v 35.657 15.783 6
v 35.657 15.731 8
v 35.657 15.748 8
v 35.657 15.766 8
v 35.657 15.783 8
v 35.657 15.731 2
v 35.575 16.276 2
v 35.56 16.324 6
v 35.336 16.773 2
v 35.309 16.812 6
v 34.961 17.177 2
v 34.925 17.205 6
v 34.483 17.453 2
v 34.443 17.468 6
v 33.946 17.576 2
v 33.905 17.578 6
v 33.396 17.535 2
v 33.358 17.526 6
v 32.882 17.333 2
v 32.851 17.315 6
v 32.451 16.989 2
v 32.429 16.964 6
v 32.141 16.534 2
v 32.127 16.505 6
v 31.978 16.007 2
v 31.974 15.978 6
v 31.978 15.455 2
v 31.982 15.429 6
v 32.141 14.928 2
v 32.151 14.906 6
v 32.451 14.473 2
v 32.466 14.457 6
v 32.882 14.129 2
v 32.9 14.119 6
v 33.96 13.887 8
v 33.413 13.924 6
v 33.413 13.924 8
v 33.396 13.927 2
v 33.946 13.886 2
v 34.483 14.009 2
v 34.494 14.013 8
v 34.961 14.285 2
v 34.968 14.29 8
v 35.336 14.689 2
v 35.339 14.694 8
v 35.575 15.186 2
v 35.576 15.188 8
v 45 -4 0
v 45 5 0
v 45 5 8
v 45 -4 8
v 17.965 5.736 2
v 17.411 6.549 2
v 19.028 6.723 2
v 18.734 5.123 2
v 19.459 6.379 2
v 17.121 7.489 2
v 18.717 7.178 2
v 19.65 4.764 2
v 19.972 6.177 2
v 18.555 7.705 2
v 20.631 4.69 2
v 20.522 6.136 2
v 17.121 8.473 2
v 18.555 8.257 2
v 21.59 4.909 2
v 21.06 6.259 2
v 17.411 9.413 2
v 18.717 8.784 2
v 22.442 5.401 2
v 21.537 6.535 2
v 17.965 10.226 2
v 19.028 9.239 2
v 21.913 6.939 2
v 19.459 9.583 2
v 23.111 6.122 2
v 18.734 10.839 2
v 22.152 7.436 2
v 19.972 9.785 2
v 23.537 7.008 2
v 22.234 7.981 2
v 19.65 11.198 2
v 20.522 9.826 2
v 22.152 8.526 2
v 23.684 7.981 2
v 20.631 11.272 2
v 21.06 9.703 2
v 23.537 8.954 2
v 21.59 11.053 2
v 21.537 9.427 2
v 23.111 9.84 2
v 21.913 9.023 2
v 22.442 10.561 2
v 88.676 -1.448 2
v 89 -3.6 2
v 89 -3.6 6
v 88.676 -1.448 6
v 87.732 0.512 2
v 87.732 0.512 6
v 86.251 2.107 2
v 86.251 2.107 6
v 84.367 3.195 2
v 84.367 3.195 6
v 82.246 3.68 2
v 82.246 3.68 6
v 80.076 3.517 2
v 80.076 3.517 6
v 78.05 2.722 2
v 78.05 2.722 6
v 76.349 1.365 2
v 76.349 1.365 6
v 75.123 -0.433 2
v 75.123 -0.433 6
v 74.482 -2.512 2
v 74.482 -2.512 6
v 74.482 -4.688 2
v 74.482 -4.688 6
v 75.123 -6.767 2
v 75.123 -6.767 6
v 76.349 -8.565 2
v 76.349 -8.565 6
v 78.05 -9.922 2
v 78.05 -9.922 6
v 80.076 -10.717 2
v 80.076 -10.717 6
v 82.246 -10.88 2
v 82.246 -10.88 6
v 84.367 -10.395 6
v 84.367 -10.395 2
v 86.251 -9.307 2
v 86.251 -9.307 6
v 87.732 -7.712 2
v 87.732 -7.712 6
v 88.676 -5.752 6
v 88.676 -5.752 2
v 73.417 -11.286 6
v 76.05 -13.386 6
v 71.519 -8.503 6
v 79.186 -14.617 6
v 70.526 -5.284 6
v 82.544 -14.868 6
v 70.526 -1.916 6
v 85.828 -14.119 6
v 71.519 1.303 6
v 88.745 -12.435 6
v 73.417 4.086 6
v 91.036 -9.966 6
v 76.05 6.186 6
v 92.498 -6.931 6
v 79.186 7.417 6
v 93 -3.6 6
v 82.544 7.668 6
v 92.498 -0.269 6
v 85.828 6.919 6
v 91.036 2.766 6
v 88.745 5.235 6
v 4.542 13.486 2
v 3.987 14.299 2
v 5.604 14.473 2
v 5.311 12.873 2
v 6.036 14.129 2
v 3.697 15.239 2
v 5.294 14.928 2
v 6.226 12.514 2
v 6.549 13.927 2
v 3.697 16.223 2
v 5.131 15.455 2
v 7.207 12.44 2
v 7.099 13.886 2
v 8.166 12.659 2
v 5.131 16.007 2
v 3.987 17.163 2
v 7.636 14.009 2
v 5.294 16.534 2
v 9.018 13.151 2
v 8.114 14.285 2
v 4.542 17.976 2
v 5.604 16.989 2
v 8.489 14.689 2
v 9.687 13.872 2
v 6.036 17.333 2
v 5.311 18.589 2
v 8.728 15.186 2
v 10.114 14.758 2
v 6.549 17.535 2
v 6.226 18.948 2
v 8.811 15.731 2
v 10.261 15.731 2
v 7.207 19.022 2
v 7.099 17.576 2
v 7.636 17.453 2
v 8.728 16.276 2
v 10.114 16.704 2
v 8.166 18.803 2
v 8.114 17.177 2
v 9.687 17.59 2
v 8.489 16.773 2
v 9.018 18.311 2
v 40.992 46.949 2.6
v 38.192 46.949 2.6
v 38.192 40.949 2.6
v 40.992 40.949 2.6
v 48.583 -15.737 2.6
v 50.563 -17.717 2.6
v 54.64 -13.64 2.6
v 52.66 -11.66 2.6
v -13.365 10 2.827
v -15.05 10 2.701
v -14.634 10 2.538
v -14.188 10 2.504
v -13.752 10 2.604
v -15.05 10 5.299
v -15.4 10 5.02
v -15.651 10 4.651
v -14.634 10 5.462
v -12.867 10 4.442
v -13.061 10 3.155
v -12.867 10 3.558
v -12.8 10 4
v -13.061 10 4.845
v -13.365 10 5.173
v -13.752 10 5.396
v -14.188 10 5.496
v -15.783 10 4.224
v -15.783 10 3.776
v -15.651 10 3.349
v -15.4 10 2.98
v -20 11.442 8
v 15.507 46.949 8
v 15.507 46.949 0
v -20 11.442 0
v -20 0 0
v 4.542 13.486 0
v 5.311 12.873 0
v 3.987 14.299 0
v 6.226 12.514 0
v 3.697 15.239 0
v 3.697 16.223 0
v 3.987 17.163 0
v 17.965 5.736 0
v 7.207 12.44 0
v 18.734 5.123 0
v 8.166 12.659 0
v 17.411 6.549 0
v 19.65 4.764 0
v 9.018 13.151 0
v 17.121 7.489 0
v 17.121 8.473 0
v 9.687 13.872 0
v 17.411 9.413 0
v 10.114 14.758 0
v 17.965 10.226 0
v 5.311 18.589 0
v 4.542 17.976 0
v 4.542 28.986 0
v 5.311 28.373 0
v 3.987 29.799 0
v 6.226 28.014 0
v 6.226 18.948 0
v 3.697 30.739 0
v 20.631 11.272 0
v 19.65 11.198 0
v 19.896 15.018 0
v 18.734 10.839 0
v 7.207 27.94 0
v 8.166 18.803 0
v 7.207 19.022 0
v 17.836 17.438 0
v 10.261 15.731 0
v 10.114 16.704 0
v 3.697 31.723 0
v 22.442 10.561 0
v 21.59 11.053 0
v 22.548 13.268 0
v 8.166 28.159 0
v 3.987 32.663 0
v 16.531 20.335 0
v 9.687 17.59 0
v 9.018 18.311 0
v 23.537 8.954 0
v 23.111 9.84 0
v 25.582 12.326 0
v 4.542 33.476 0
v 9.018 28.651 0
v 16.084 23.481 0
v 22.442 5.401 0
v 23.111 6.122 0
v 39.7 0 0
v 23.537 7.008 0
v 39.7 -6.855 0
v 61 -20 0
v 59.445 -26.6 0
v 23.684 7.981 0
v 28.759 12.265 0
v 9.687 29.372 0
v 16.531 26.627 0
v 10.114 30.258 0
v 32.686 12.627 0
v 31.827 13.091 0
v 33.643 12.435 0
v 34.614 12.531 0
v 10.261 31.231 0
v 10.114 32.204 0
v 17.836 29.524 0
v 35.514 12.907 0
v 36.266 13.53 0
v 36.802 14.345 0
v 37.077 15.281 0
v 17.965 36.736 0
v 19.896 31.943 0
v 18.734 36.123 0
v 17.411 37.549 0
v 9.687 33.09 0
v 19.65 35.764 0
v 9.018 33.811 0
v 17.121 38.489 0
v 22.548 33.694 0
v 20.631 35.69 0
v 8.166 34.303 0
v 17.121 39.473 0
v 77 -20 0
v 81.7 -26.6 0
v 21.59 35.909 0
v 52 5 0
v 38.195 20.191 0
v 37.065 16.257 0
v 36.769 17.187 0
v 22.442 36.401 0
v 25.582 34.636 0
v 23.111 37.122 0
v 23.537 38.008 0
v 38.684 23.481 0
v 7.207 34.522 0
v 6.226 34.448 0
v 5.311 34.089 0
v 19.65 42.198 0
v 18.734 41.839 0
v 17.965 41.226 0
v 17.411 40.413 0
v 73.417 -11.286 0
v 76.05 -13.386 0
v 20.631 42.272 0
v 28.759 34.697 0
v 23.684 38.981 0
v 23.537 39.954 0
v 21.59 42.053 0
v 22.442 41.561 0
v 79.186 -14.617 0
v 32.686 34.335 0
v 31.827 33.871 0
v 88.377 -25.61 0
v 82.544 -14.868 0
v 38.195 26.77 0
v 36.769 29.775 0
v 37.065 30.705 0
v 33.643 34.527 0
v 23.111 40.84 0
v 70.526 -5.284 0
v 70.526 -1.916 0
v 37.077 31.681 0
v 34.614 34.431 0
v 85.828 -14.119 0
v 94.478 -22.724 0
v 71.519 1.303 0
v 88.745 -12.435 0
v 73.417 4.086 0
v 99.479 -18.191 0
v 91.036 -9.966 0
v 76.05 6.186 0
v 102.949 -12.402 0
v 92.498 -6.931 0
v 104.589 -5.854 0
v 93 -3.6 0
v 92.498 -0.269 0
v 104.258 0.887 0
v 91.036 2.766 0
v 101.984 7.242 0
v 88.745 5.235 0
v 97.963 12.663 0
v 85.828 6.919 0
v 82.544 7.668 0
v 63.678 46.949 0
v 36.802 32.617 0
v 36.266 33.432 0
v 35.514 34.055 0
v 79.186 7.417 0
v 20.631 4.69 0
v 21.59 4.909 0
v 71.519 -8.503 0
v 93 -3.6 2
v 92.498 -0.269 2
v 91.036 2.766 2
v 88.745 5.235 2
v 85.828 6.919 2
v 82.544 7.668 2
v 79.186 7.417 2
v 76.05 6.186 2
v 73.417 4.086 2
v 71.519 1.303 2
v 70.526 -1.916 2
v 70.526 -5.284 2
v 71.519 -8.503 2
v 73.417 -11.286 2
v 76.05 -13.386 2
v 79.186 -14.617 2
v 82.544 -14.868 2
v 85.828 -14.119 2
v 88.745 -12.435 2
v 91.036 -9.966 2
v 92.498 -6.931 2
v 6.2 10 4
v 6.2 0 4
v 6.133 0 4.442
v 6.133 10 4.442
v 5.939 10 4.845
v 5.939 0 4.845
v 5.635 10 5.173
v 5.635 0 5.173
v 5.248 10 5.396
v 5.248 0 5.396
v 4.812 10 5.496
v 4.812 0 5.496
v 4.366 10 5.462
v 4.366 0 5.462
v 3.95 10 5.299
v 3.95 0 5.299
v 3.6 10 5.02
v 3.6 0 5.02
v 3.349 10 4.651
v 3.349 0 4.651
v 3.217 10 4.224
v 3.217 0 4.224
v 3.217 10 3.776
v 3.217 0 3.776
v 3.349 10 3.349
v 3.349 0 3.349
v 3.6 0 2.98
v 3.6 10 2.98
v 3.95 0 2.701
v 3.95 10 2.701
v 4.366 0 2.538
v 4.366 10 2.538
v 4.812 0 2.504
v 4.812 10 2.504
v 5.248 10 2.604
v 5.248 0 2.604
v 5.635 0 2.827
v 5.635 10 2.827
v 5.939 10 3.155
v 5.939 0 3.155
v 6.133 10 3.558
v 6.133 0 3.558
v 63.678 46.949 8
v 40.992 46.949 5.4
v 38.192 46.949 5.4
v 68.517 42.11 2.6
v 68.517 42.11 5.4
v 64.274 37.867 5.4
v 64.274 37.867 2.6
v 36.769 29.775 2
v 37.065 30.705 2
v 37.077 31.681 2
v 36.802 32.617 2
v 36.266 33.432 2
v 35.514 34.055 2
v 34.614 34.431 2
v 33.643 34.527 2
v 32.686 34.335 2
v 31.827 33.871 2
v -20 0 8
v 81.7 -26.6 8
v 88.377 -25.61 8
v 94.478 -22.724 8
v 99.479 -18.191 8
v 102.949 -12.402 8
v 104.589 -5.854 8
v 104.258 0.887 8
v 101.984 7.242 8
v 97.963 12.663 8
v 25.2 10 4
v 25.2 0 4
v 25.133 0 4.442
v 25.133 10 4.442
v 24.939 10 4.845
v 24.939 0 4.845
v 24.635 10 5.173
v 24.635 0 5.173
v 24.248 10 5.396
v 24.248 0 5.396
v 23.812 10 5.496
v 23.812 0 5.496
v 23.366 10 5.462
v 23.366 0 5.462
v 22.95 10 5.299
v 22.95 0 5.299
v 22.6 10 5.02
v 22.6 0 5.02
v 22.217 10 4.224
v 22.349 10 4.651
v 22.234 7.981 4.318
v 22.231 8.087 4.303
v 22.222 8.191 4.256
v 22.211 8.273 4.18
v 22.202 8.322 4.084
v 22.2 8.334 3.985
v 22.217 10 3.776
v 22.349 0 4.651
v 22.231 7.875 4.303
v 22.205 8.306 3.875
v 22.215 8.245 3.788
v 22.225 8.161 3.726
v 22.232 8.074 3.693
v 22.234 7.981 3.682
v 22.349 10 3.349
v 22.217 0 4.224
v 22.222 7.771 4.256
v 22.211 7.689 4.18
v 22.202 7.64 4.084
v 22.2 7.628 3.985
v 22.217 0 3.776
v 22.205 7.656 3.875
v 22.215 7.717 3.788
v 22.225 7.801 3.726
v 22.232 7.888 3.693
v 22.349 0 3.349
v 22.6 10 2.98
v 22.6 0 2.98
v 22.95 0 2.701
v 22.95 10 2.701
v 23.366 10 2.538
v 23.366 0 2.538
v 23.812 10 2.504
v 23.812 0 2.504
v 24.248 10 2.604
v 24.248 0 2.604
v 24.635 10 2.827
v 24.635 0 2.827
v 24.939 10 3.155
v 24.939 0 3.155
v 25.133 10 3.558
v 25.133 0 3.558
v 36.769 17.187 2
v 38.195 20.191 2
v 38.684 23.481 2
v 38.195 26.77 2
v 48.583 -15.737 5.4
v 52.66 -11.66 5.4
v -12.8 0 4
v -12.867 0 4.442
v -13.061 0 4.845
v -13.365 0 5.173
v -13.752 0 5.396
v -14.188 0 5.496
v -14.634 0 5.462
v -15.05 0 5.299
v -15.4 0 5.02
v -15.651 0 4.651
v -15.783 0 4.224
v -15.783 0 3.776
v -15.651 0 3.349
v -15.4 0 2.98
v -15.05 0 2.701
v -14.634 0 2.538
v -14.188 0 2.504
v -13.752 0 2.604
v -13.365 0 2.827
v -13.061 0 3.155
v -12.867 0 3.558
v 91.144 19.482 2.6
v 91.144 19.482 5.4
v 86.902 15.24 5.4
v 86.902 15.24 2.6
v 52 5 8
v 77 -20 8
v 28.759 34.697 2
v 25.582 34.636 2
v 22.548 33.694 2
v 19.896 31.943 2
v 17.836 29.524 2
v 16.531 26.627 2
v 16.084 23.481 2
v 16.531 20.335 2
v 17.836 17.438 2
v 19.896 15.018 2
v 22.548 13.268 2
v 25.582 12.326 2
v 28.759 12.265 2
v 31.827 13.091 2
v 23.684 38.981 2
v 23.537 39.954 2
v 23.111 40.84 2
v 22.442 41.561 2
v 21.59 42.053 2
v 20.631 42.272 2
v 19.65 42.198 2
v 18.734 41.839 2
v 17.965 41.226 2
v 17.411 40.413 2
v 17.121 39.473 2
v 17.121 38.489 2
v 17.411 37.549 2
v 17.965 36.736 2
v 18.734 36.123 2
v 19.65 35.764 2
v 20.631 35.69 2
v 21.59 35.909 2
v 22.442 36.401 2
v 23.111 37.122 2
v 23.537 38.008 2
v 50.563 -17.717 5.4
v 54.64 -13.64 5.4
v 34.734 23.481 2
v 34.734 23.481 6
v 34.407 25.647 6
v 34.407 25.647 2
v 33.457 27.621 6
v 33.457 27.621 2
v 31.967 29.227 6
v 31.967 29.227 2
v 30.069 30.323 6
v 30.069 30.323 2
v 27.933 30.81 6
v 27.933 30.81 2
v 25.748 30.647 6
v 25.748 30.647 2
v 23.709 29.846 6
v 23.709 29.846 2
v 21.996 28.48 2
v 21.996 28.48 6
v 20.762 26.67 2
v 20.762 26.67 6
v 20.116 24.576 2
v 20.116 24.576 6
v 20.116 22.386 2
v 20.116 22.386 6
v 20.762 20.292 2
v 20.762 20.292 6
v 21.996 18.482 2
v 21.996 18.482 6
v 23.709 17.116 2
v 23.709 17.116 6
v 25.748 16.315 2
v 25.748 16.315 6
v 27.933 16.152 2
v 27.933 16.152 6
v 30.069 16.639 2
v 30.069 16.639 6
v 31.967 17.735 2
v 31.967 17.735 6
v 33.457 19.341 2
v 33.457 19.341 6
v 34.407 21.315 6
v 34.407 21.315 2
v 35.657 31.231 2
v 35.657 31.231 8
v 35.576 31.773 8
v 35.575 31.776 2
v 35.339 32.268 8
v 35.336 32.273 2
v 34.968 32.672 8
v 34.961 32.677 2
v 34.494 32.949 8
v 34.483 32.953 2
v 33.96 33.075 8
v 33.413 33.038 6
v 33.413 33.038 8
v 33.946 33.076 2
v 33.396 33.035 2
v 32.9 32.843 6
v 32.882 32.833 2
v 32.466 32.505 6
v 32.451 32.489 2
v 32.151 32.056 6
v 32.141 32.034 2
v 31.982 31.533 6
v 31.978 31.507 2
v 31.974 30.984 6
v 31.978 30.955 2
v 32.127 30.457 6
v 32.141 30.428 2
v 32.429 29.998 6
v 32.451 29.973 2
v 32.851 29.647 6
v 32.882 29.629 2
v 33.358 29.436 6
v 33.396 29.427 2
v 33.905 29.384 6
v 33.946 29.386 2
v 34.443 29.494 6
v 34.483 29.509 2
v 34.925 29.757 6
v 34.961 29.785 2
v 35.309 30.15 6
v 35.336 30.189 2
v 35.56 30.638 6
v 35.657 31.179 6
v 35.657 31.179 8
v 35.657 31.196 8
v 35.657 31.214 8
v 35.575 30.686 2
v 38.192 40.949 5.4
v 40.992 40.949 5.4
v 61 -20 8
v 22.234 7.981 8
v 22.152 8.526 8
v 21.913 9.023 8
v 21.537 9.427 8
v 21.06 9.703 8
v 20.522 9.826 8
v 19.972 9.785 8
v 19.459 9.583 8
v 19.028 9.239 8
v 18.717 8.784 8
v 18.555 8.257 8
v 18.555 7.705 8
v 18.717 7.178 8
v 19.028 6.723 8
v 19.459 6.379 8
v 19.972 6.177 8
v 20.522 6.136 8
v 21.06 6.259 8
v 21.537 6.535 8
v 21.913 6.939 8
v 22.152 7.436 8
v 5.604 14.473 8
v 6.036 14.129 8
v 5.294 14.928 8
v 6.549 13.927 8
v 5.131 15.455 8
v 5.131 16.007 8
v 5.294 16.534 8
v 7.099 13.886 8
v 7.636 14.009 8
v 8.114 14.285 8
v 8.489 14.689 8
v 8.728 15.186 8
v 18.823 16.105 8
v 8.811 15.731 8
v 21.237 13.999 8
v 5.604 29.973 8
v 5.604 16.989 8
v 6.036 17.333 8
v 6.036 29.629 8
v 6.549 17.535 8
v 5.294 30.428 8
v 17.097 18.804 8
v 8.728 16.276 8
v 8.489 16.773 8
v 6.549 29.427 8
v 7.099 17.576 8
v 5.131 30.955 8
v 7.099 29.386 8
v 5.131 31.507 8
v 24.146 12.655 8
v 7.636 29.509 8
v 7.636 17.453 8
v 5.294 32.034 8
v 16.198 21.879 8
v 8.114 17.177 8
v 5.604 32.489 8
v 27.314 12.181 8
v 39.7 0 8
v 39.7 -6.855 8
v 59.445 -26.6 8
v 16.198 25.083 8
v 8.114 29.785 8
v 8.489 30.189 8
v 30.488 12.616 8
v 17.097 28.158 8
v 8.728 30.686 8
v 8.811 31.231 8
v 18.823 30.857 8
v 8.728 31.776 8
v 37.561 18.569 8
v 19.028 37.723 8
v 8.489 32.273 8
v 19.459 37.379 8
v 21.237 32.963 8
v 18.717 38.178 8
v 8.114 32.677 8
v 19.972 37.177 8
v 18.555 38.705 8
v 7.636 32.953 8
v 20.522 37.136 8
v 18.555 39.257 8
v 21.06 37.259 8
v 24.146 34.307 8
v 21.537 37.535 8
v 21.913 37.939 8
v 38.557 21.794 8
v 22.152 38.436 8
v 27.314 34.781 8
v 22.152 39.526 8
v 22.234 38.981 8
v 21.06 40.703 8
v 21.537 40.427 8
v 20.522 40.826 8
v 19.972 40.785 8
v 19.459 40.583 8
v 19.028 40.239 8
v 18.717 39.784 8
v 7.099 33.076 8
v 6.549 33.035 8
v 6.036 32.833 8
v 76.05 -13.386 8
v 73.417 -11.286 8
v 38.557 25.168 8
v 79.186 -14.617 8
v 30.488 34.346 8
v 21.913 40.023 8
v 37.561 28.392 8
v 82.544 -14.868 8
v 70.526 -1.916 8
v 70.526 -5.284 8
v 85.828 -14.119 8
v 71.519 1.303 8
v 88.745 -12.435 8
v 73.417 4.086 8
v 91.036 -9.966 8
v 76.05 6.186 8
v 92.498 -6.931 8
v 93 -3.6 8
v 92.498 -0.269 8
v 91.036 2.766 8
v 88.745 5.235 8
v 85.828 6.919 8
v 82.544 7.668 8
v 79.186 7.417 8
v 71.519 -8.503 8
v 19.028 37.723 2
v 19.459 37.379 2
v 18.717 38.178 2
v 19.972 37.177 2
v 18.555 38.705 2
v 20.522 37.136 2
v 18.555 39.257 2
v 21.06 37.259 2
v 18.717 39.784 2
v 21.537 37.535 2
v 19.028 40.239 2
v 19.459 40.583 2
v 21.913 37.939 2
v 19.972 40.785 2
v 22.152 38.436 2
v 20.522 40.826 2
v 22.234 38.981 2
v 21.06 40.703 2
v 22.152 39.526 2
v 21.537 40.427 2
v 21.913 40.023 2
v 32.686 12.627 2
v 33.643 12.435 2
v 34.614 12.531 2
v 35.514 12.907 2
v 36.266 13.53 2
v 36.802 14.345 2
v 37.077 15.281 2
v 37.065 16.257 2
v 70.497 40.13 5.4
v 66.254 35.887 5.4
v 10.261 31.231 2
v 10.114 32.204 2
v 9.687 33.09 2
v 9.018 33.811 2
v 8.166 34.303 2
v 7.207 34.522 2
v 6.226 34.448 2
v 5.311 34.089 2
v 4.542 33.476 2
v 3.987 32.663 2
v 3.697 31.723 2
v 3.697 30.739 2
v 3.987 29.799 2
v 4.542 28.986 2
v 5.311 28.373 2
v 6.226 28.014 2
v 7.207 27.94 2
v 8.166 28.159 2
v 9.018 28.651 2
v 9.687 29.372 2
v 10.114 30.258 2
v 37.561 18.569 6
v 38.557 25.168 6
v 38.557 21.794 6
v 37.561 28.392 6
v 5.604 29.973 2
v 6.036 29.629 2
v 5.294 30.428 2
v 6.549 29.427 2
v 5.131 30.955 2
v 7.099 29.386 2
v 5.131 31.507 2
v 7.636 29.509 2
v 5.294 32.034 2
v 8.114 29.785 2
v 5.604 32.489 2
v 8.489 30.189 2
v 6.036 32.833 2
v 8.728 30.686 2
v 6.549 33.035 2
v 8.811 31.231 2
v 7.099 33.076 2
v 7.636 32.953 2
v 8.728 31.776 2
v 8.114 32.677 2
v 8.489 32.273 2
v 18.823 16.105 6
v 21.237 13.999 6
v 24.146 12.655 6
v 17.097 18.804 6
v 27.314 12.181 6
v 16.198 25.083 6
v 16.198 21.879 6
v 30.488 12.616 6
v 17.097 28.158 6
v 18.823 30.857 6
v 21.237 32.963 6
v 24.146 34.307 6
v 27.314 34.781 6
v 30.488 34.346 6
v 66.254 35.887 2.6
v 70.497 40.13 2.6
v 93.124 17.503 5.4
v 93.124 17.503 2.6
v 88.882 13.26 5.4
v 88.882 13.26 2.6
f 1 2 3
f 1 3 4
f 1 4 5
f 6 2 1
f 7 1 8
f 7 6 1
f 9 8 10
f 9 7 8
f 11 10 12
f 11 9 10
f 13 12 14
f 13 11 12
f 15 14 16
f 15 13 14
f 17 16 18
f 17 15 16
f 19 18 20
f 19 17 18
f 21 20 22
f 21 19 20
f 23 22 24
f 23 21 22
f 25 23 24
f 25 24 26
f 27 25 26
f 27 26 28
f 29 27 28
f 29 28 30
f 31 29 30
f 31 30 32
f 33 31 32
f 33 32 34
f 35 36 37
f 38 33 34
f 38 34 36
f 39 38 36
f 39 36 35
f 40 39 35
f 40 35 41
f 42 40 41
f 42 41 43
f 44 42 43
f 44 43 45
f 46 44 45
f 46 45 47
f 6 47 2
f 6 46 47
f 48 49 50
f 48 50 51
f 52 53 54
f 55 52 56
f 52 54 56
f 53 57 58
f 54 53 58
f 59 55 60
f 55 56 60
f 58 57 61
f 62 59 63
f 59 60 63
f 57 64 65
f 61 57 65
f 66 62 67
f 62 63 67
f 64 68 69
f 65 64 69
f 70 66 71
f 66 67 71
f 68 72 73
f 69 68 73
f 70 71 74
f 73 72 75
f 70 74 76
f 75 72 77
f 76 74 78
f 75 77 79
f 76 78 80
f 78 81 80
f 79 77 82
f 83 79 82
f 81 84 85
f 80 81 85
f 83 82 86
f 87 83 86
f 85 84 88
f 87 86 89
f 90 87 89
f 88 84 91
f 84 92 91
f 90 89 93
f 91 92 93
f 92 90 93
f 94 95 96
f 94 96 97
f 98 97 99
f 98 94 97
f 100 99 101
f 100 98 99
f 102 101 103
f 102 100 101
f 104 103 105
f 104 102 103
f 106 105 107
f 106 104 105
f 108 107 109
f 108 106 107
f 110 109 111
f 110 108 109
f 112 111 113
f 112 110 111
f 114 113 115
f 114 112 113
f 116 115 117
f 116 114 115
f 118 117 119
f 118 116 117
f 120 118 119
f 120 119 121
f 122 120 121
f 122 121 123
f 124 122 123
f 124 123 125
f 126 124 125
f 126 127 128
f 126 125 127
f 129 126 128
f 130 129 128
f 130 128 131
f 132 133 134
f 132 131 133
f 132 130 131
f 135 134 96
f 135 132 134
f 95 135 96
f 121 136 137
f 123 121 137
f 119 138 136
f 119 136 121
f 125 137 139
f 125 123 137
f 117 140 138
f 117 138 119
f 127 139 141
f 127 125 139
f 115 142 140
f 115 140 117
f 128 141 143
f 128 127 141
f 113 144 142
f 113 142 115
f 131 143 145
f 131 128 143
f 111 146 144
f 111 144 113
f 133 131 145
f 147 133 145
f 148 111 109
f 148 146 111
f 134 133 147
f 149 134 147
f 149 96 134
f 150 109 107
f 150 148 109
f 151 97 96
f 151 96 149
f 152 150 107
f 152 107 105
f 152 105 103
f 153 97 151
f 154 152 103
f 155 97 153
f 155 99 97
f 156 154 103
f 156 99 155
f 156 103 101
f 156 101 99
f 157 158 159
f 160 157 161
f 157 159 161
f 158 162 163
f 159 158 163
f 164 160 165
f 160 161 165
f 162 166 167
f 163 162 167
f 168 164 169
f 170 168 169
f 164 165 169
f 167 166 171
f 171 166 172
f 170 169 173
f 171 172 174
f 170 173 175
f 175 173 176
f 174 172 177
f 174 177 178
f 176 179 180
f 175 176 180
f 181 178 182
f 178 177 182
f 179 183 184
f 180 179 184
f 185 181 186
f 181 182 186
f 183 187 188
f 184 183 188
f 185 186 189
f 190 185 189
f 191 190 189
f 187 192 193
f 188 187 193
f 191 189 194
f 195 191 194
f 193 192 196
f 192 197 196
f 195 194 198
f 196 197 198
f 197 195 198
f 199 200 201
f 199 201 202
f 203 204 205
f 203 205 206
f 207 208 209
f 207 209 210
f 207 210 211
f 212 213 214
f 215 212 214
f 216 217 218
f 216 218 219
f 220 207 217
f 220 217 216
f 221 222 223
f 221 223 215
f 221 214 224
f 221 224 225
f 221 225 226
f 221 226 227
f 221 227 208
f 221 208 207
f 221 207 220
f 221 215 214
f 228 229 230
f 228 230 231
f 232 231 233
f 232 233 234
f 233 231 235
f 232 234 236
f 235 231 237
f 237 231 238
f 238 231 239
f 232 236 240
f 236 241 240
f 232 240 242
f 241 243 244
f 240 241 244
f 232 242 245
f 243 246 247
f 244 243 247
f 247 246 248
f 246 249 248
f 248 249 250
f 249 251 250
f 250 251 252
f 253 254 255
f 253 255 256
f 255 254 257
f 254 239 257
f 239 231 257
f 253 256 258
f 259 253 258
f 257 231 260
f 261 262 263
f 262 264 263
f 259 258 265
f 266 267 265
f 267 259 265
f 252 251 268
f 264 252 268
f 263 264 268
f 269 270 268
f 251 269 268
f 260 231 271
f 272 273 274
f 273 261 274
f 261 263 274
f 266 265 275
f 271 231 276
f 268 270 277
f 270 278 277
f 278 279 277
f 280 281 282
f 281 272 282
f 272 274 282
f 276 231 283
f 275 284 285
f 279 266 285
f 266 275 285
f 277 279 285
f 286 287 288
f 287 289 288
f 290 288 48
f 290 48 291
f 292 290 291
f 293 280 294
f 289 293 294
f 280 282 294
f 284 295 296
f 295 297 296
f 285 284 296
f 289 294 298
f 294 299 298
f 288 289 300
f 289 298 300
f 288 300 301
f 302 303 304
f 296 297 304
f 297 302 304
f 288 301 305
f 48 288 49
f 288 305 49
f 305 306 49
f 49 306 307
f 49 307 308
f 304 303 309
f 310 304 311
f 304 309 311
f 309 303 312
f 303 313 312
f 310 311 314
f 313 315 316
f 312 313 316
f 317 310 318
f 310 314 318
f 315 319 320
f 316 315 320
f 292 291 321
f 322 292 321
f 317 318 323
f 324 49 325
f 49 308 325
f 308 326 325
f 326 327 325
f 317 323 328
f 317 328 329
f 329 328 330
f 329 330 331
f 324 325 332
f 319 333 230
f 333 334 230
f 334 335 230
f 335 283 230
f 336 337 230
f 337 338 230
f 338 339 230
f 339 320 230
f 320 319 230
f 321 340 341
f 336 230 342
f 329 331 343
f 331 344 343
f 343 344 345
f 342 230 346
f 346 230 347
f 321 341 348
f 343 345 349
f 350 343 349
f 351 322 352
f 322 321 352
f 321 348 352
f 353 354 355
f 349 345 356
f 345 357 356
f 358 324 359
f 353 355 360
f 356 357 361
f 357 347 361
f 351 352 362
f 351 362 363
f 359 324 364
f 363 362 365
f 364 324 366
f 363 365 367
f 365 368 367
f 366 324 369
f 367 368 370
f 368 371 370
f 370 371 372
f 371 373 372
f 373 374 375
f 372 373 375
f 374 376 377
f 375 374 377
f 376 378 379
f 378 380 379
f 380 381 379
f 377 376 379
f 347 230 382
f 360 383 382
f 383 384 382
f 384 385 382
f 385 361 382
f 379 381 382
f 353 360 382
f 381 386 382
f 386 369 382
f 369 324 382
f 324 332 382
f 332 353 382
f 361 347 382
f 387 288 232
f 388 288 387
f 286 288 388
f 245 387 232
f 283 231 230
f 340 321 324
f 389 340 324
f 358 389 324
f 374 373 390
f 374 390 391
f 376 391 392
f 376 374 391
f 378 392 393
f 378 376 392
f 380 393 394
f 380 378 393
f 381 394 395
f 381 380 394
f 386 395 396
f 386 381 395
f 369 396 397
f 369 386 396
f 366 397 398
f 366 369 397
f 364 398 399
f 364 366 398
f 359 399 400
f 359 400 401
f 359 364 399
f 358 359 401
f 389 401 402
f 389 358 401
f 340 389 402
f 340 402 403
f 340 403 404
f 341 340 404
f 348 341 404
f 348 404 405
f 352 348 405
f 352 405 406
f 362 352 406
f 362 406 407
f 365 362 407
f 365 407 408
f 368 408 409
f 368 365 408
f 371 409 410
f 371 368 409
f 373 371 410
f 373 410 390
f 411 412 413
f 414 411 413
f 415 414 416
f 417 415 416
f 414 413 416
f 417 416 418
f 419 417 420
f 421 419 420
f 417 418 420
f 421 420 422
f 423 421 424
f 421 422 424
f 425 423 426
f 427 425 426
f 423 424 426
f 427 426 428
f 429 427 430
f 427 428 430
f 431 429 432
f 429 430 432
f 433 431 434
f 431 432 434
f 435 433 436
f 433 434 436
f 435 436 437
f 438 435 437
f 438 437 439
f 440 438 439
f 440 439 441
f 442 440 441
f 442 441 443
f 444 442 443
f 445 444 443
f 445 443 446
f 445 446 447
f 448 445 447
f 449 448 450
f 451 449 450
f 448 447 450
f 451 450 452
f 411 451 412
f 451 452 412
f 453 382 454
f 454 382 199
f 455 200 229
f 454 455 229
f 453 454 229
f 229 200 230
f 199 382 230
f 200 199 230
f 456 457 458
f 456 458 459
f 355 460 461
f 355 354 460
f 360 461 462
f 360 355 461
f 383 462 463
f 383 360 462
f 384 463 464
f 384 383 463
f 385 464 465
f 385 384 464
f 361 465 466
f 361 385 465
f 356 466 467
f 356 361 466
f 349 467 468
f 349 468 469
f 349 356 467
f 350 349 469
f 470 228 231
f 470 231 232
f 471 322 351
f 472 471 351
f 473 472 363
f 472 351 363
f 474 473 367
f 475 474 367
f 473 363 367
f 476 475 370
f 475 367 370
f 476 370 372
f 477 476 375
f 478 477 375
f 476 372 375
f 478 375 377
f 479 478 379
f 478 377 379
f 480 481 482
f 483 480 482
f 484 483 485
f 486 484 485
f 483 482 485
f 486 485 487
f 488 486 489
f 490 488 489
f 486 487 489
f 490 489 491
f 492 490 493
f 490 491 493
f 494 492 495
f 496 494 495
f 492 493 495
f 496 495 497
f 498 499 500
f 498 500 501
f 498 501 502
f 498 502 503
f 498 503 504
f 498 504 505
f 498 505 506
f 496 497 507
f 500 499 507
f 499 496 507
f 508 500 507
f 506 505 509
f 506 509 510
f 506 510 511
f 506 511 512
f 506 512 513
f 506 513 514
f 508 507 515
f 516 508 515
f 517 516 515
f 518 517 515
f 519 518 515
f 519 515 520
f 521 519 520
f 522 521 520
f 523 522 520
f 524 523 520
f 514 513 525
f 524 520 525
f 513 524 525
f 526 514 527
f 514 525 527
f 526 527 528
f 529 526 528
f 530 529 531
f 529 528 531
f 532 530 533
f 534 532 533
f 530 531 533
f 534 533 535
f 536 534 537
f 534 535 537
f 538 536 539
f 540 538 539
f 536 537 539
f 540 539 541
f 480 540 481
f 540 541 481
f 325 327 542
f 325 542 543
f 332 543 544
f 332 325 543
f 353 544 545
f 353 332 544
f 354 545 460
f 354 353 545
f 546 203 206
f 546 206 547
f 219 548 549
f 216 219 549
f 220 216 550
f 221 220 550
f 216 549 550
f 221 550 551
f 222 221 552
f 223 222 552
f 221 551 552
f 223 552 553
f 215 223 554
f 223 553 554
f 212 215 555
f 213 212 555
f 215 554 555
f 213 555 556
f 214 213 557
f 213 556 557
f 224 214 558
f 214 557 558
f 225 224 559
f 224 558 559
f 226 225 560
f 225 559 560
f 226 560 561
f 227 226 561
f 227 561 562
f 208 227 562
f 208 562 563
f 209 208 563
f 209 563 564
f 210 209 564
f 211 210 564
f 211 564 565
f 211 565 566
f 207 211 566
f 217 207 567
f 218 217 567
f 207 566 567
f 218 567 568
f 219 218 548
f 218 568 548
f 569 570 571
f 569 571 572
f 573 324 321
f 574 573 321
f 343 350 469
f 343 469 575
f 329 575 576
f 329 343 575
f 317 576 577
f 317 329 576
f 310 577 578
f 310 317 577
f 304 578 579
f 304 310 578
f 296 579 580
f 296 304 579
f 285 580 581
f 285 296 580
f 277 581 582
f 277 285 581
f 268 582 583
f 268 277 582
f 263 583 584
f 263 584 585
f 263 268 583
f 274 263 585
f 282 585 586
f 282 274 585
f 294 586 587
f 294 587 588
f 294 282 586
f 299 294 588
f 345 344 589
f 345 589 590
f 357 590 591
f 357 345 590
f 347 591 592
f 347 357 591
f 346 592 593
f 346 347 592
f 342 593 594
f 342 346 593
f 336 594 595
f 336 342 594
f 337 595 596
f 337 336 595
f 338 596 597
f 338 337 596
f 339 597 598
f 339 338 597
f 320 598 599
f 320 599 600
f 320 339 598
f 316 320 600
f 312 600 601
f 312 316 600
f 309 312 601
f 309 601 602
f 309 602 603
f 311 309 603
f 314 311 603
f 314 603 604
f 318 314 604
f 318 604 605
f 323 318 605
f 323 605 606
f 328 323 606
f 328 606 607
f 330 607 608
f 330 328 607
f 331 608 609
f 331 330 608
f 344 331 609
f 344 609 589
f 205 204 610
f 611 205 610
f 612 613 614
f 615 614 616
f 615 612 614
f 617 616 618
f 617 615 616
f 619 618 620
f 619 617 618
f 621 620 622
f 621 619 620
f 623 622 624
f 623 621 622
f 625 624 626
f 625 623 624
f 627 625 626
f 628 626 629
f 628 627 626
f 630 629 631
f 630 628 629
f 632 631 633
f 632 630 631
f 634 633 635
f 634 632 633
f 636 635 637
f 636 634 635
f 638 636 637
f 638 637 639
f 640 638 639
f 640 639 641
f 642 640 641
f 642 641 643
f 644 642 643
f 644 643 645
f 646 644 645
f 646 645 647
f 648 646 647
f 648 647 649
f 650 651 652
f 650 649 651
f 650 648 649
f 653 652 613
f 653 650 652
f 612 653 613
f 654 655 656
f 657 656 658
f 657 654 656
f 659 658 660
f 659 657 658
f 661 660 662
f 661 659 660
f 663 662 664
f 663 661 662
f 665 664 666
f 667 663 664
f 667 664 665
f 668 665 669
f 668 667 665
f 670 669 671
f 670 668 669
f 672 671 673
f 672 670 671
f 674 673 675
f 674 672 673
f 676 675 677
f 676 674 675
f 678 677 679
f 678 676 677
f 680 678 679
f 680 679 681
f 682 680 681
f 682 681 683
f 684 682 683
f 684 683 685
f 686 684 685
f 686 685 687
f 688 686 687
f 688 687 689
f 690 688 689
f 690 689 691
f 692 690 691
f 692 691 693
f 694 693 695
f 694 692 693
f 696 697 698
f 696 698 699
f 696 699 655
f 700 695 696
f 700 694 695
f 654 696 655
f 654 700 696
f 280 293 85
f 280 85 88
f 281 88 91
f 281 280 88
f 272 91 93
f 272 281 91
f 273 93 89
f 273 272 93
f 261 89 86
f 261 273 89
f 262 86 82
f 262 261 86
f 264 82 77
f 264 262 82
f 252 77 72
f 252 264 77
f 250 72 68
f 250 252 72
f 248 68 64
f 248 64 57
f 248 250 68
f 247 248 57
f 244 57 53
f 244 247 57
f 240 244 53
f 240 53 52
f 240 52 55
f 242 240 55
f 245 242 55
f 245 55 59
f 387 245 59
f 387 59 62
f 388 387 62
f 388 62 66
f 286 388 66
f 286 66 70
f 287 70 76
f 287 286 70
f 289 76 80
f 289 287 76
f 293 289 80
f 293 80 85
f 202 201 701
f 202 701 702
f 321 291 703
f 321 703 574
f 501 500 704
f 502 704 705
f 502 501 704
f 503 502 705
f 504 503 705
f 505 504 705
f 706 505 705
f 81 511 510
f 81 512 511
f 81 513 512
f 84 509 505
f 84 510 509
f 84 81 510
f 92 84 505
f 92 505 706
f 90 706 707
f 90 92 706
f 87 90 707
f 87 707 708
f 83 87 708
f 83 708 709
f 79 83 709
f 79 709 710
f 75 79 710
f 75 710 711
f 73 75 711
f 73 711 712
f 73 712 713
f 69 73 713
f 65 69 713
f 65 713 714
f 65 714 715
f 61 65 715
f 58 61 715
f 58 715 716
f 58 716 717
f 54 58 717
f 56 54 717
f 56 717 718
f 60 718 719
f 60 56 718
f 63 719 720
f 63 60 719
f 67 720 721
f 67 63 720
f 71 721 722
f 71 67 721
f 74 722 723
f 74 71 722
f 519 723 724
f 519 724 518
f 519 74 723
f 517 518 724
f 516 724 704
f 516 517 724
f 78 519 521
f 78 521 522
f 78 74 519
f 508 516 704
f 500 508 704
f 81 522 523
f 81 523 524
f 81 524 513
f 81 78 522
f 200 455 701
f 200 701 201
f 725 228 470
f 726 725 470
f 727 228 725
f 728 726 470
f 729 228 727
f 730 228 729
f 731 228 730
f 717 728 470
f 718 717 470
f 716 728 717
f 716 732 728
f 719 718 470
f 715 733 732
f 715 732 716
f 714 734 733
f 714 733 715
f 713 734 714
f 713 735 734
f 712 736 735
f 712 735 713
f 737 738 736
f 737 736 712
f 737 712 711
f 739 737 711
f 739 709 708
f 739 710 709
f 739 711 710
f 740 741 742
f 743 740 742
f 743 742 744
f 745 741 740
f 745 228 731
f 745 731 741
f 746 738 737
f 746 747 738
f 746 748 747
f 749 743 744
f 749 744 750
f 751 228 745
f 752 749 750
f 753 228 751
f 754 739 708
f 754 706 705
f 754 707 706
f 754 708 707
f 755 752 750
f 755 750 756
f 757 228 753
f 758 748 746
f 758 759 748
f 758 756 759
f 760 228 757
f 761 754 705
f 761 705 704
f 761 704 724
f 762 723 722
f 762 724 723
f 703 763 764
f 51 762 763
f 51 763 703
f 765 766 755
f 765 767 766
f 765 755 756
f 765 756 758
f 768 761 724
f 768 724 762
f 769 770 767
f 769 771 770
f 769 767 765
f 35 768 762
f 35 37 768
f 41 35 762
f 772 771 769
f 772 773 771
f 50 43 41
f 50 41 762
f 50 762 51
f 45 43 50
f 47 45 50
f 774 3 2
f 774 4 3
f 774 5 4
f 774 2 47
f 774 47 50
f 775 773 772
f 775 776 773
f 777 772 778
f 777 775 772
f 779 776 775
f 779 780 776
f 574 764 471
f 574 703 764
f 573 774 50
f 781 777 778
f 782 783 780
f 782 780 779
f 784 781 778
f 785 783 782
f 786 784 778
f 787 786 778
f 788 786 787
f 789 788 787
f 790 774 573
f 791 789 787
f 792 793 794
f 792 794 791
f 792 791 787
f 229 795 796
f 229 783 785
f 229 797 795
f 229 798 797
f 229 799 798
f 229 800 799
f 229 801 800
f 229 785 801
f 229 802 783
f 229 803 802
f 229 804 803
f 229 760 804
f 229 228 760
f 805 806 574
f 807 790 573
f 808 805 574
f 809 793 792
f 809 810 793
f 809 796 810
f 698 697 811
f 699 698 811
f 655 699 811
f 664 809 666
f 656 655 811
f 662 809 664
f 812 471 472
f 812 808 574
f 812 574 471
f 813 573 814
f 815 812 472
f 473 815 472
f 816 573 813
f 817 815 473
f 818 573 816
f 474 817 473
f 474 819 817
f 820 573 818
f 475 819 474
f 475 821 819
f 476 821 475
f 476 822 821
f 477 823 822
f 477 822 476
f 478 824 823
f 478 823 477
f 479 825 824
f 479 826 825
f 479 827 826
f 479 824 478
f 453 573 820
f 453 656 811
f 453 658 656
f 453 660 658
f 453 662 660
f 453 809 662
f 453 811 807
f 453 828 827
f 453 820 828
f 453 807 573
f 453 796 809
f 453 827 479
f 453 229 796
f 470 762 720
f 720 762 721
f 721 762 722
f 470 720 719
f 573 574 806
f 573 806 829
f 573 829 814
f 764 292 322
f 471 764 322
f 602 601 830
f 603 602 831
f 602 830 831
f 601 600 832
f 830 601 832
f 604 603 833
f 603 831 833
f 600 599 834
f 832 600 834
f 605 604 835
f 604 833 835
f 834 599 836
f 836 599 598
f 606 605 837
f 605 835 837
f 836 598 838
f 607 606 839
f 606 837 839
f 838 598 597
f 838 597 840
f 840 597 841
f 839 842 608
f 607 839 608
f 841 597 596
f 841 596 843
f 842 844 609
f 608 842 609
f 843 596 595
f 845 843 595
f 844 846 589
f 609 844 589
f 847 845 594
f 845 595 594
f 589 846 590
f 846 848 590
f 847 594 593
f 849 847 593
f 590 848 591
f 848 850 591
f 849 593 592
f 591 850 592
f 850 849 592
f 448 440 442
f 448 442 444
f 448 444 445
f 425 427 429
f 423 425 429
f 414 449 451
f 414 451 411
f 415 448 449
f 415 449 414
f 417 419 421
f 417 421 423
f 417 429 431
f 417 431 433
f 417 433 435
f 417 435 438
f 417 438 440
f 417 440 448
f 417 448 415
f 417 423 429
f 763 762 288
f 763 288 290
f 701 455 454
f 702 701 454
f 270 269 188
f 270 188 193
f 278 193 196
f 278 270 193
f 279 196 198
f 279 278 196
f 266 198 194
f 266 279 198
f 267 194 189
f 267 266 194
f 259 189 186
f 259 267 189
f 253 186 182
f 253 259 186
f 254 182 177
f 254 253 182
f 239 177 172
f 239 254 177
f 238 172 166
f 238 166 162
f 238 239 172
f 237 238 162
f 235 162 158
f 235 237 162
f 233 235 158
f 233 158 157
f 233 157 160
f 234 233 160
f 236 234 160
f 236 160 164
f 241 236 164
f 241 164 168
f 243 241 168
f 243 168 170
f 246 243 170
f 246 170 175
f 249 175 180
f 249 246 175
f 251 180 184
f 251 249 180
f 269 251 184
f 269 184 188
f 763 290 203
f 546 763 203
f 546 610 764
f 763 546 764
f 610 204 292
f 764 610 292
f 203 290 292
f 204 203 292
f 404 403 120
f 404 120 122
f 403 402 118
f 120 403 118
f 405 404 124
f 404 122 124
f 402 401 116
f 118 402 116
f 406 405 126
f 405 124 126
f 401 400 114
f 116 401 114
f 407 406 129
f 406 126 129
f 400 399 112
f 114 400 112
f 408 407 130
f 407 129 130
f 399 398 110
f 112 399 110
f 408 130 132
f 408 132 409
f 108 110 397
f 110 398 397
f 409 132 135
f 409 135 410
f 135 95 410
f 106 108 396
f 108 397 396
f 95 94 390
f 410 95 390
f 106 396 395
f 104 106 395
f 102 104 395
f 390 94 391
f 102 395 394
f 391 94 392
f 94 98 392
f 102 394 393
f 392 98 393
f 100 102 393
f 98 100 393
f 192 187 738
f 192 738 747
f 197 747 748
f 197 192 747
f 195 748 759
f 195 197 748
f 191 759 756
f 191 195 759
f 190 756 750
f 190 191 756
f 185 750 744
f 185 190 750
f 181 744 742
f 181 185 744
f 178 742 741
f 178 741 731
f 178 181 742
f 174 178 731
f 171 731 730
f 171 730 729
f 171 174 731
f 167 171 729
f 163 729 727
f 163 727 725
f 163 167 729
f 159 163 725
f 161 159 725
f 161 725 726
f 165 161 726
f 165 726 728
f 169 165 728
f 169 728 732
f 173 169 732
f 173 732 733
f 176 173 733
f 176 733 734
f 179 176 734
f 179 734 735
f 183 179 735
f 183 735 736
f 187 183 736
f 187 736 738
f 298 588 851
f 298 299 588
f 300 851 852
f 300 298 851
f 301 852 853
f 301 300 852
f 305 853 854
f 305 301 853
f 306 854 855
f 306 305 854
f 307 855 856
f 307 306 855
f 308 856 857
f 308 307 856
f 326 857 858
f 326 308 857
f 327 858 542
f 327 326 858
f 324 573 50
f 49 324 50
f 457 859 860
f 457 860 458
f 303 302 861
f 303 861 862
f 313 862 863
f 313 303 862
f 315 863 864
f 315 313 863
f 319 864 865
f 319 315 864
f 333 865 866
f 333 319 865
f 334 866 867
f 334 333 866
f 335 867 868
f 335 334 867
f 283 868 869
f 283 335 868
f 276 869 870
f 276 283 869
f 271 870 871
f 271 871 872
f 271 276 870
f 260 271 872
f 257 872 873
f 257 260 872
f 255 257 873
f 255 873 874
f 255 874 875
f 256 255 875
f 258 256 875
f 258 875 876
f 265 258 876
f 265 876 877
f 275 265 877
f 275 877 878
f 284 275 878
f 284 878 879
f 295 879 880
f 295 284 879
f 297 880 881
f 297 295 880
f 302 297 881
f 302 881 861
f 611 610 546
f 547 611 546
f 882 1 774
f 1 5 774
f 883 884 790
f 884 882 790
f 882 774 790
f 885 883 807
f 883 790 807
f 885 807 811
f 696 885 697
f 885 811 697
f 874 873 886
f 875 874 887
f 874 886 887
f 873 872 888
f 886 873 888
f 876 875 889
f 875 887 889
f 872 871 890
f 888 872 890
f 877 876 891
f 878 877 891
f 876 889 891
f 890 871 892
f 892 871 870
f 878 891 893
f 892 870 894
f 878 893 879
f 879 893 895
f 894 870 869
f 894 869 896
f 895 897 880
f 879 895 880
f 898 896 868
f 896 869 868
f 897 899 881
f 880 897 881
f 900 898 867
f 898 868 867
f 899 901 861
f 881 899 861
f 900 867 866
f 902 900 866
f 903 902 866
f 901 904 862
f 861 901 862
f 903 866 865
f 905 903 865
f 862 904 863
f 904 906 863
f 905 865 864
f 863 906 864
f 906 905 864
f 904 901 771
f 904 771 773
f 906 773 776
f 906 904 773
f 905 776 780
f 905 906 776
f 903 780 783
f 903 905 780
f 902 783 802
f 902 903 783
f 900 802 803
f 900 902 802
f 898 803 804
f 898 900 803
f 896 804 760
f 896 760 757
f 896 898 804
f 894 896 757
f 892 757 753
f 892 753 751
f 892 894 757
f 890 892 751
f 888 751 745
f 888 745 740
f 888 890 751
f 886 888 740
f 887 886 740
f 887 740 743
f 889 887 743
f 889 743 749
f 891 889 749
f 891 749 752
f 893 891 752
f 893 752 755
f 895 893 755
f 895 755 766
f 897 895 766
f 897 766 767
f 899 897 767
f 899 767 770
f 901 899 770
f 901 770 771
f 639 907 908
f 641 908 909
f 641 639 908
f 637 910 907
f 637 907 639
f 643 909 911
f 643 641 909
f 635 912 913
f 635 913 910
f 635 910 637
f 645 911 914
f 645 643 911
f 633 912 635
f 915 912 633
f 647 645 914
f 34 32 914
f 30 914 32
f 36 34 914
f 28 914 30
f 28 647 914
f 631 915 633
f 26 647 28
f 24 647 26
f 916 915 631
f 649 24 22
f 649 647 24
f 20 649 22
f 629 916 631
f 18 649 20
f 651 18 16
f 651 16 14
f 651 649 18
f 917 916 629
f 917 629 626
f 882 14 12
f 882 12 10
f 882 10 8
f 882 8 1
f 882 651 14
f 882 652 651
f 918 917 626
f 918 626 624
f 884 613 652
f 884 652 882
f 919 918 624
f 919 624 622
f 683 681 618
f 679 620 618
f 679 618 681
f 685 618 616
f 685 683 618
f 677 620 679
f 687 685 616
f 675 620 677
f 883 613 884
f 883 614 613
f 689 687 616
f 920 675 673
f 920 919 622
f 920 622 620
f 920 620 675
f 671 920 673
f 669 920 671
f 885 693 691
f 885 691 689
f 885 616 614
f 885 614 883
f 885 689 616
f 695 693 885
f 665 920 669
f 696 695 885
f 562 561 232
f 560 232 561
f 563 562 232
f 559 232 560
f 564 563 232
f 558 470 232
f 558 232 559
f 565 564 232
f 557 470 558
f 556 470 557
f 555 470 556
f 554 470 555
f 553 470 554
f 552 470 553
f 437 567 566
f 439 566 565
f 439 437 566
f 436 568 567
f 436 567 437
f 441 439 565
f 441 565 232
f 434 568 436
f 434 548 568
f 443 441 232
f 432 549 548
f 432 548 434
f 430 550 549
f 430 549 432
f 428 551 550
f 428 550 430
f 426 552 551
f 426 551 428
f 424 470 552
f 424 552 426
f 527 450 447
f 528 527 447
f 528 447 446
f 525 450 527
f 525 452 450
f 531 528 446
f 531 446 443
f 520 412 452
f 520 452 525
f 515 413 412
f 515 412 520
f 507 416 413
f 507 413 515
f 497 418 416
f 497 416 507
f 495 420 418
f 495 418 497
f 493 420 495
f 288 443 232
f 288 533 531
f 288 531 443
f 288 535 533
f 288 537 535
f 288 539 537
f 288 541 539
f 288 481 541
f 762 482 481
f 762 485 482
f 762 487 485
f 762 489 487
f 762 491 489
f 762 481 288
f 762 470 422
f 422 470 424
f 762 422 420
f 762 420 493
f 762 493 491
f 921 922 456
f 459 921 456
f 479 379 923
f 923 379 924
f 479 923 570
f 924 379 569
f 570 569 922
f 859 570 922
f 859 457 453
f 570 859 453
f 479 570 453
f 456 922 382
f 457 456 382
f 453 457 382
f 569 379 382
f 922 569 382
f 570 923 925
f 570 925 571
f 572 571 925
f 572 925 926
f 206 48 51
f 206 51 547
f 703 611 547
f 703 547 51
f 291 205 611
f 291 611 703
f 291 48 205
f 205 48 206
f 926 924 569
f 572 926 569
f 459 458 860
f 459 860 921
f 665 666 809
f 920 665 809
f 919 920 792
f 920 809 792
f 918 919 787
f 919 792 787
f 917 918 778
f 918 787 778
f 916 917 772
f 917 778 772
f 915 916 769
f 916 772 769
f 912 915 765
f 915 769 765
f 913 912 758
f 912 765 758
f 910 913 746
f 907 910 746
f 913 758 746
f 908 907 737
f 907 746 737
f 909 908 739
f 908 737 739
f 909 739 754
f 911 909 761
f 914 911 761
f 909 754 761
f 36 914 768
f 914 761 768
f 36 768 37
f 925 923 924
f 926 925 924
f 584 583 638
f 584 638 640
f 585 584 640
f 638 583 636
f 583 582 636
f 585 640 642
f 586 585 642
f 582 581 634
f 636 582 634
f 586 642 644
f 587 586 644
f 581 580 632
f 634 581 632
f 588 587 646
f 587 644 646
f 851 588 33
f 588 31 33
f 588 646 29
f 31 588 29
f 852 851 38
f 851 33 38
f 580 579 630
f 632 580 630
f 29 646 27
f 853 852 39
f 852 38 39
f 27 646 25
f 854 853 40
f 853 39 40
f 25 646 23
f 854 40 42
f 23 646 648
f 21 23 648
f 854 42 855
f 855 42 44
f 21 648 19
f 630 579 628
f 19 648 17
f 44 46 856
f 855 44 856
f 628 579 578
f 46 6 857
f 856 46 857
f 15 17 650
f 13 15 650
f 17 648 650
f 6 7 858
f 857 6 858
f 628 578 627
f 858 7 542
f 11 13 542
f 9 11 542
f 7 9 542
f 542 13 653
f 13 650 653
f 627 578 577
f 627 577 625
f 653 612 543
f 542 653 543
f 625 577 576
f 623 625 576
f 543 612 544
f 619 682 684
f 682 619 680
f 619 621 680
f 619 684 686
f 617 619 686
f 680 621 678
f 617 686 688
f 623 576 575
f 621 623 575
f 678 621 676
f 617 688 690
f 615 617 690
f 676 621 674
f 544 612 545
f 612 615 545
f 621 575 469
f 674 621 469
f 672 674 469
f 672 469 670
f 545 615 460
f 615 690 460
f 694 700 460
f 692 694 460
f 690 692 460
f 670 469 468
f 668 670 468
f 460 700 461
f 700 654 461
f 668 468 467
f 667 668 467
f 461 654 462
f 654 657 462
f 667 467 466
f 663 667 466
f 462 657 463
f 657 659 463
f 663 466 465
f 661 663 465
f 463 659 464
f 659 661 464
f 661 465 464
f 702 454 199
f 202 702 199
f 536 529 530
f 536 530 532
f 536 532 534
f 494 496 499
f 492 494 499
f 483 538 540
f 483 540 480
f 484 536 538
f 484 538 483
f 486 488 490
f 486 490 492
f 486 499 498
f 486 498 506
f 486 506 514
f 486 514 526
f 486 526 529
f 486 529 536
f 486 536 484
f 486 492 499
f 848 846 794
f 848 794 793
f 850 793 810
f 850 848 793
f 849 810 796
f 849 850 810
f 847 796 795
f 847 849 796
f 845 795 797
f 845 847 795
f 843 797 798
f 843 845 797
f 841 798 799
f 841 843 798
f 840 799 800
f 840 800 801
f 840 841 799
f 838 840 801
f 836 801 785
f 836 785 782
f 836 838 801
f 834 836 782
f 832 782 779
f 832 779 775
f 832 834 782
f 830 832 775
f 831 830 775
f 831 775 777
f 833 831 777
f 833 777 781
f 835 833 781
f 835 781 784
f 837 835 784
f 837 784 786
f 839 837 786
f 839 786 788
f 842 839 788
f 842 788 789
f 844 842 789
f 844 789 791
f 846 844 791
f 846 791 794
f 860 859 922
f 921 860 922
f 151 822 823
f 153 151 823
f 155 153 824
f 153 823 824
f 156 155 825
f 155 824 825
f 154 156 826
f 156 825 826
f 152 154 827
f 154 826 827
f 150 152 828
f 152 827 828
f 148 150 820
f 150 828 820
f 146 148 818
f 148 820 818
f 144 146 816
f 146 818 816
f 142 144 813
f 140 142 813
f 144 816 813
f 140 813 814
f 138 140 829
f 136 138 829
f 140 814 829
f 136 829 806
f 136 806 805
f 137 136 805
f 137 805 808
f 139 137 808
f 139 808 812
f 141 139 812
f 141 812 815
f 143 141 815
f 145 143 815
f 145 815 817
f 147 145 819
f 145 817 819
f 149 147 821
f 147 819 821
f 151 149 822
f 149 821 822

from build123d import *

# Parameters (mm, degrees)
MODEL_R                  = 7.35
MODEL_R_2                = 7.3
MODEL_R_3                = 1.85
RESSALTO_EXTRUS_O1_DEPTH = 8
ESBO_O3_R                = 11.3
CORTE_EXTRUS_O1_DEPTH    = 2
ESBO_O4_R                = 11.3
CORTE_EXTRUS_O2_DEPTH    = 2
ESBO_O2_R                = 3.3
CORTE_EXTRUS_O4_DEPTH    = 2
ESBO_O7_W                = 2.8
ESBO_O7_H                = 2.8
CORTE_EXTRUS_O6_DEPTH    = 6
ESBO_O8_W                = 2.8
ESBO_O8_H                = 2.8
CORTE_EXTRUS_O7_DEPTH    = 6
ESBO_O10_W               = 2.8
ESBO_O10_H               = 2.8
CORTE_EXTRUS_O9_DEPTH    = 6
RESSALTO_EXTRUS_O3_DEPTH = 8
ESBO_O6_R                = 1.5
CORTE_EXTRUS_O5_DEPTH    = 10
ESBO_O15_R               = 11.3
RESSALTO_EXTRUS_O4_DEPTH = 8


with BuildPart() as part:
    # Model → Ressalto-extrusão1 (new body)
    with BuildSketch(Plane.XY):
        with BuildLine():
            Line((0, 0), (39, 0))
            Line((39, 0), (39.7, 0))
            Line((39.7, 0), (39.7, -6.854833996))
            Line((39.7, -6.854833996), (52.445166004, -19.6))
            Line((52.445166004, -19.6), (59.445166004, -26.6))
            Line((59.445166004, -26.6), (81.699998871, -26.6))
            ThreePointArc((81.699998871, -26.6), (102.949229032, -12.401719466), (97.963455967, 12.663455967))
            Line((97.963455967, 12.663455967), (63.677897161, 46.949014774))
            Line((63.677897161, 46.949014774), (50.111140335, 46.949014774))
            Line((50.111140335, 46.949014774), (15.50707852, 46.949014774))
            Line((15.50707852, 46.949014774), (0, 31.441936254))
            Line((0, 31.441936254), (0, 0))
        make_face()
        with Locations((59.072583002, 19.027416998)):
            Circle(MODEL_R, mode=Mode.SUBTRACT)
        with Locations((81.7, -3.6)):
            Circle(MODEL_R_2, mode=Mode.SUBTRACT)
        with Locations((6.960594046, 15.730973227)):
            Circle(MODEL_R_3, mode=Mode.SUBTRACT)
        with Locations((6.960594046, 31.230973227)):
            Circle(MODEL_R_3, mode=Mode.SUBTRACT)
        with Locations((20.383987804, 38.980973227)):
            Circle(MODEL_R_3, mode=Mode.SUBTRACT)
        with Locations((33.807381563, 31.230973227)):
            Circle(MODEL_R_3, mode=Mode.SUBTRACT)
        with Locations((33.807381563, 15.730973227)):
            Circle(MODEL_R_3, mode=Mode.SUBTRACT)
        with Locations((20.383987804, 7.980973227)):
            Circle(MODEL_R_3, mode=Mode.SUBTRACT)
        with Locations((27.383987804, 23.480973227)):
            Circle(MODEL_R, mode=Mode.SUBTRACT)
        Polygon((72, -15), (52, 5), (45, 5), (45, -4), (61, -20), (77, -20), align=None, mode=Mode.SUBTRACT)
    extrude(amount=RESSALTO_EXTRUS_O1_DEPTH)

    # Esboço3 → Corte-extrusão1 (cut)
    with BuildSketch(Plane.XY):
        with Locations((81.7, -3.6)):
            Circle(ESBO_O3_R)
        with Locations((59.0726, 19.0274)):
            Circle(ESBO_O3_R)
        with Locations((27.384004802, 23.480956229)):
            Circle(ESBO_O3_R)
    extrude(amount=CORTE_EXTRUS_O1_DEPTH, mode=Mode.SUBTRACT)

    # Esboço4 → Corte-extrusão2 (cut)
    with BuildSketch(Plane.XY.offset(8)):
        with Locations((81.7, -3.6)):
            Circle(ESBO_O4_R)
        with Locations((59.0726, 19.0274)):
            Circle(ESBO_O4_R)
        with Locations((27.384004802, 23.480956229)):
            Circle(ESBO_O4_R)
    extrude(amount=-CORTE_EXTRUS_O2_DEPTH, mode=Mode.SUBTRACT)

    # Esboço2 → Corte-extrusão4 (cut)
    with BuildSketch(Plane.XY):
        with Locations((6.960594802, 15.730956229)):
            Circle(ESBO_O2_R)
        with Locations((6.960594802, 31.230956229)):
            Circle(ESBO_O2_R)
        with Locations((33.807404802, 15.730956229)):
            Circle(ESBO_O2_R)
        with Locations((20.384004802, 38.980956229)):
            Circle(ESBO_O2_R)
        with Locations((33.807404802, 31.230956229)):
            Circle(ESBO_O2_R)
        with Locations((20.384004802, 7.980976229)):
            Circle(ESBO_O2_R)
    extrude(amount=CORTE_EXTRUS_O4_DEPTH, mode=Mode.SUBTRACT)

    # Esboço7 → Corte-extrusão6 (cut)
    with BuildSketch(Plane(origin=(55.313455967, 55.313455967, 0), x_dir=(0, 0, -1), z_dir=(0.707106781, 0.707106781, 0))):
        with Locations((-4, -52.072657306)):
            Rectangle(ESBO_O7_W, ESBO_O7_H)
        with Locations((-4, -20.072657306)):
            Rectangle(ESBO_O7_W, ESBO_O7_H)
    extrude(amount=-CORTE_EXTRUS_O6_DEPTH, mode=Mode.SUBTRACT)

    # Esboço8 → Corte-extrusão7 (cut)
    with BuildSketch(Plane(origin=(0, 46.949014774, 0), x_dir=(1, 0, 0), z_dir=(0, 1, 0))):
        with Locations((39.59248784, -4)):
            Rectangle(ESBO_O8_W, ESBO_O8_H)
    extrude(amount=-CORTE_EXTRUS_O7_DEPTH, mode=Mode.SUBTRACT)

    # Esboço10 → Corte-extrusão9 (cut)
    with BuildSketch(Plane(origin=(16.422583002, 16.422583002, 0), x_dir=(0, 0, 1), z_dir=(-0.707106781, -0.707106781, 0))):
        with Locations((4, -46.881179593)):
            Rectangle(ESBO_O10_W, ESBO_O10_H)
    extrude(amount=-CORTE_EXTRUS_O9_DEPTH, mode=Mode.SUBTRACT)

    # Esboço13 → Ressalto-extrusão3 (add)
    with BuildSketch(Plane.XY.offset(8)):
        Polygon((0, 31.441936254), (-20, 11.441936254), (-20, 0), (0, 0), align=None)
    extrude(amount=-RESSALTO_EXTRUS_O3_DEPTH)

    # Esboço6 → Corte-extrusão5 (cut)
    with BuildSketch(Plane.XZ):
        with Locations((4.7, 4)):
            Circle(ESBO_O6_R)
        with Locations((23.7, 4)):
            Circle(ESBO_O6_R)
        with Locations((-14.3, 4)):
            Circle(ESBO_O6_R)
    extrude(amount=-CORTE_EXTRUS_O5_DEPTH, mode=Mode.SUBTRACT)

    # Esboço15 → Ressalto-extrusão4 (add)
    with BuildSketch(Plane.XY.offset(8)):
        with Locations((59.0726, 19.0274)):
            Circle(ESBO_O15_R)
    extrude(amount=-RESSALTO_EXTRUS_O4_DEPTH)


solid = part.part
